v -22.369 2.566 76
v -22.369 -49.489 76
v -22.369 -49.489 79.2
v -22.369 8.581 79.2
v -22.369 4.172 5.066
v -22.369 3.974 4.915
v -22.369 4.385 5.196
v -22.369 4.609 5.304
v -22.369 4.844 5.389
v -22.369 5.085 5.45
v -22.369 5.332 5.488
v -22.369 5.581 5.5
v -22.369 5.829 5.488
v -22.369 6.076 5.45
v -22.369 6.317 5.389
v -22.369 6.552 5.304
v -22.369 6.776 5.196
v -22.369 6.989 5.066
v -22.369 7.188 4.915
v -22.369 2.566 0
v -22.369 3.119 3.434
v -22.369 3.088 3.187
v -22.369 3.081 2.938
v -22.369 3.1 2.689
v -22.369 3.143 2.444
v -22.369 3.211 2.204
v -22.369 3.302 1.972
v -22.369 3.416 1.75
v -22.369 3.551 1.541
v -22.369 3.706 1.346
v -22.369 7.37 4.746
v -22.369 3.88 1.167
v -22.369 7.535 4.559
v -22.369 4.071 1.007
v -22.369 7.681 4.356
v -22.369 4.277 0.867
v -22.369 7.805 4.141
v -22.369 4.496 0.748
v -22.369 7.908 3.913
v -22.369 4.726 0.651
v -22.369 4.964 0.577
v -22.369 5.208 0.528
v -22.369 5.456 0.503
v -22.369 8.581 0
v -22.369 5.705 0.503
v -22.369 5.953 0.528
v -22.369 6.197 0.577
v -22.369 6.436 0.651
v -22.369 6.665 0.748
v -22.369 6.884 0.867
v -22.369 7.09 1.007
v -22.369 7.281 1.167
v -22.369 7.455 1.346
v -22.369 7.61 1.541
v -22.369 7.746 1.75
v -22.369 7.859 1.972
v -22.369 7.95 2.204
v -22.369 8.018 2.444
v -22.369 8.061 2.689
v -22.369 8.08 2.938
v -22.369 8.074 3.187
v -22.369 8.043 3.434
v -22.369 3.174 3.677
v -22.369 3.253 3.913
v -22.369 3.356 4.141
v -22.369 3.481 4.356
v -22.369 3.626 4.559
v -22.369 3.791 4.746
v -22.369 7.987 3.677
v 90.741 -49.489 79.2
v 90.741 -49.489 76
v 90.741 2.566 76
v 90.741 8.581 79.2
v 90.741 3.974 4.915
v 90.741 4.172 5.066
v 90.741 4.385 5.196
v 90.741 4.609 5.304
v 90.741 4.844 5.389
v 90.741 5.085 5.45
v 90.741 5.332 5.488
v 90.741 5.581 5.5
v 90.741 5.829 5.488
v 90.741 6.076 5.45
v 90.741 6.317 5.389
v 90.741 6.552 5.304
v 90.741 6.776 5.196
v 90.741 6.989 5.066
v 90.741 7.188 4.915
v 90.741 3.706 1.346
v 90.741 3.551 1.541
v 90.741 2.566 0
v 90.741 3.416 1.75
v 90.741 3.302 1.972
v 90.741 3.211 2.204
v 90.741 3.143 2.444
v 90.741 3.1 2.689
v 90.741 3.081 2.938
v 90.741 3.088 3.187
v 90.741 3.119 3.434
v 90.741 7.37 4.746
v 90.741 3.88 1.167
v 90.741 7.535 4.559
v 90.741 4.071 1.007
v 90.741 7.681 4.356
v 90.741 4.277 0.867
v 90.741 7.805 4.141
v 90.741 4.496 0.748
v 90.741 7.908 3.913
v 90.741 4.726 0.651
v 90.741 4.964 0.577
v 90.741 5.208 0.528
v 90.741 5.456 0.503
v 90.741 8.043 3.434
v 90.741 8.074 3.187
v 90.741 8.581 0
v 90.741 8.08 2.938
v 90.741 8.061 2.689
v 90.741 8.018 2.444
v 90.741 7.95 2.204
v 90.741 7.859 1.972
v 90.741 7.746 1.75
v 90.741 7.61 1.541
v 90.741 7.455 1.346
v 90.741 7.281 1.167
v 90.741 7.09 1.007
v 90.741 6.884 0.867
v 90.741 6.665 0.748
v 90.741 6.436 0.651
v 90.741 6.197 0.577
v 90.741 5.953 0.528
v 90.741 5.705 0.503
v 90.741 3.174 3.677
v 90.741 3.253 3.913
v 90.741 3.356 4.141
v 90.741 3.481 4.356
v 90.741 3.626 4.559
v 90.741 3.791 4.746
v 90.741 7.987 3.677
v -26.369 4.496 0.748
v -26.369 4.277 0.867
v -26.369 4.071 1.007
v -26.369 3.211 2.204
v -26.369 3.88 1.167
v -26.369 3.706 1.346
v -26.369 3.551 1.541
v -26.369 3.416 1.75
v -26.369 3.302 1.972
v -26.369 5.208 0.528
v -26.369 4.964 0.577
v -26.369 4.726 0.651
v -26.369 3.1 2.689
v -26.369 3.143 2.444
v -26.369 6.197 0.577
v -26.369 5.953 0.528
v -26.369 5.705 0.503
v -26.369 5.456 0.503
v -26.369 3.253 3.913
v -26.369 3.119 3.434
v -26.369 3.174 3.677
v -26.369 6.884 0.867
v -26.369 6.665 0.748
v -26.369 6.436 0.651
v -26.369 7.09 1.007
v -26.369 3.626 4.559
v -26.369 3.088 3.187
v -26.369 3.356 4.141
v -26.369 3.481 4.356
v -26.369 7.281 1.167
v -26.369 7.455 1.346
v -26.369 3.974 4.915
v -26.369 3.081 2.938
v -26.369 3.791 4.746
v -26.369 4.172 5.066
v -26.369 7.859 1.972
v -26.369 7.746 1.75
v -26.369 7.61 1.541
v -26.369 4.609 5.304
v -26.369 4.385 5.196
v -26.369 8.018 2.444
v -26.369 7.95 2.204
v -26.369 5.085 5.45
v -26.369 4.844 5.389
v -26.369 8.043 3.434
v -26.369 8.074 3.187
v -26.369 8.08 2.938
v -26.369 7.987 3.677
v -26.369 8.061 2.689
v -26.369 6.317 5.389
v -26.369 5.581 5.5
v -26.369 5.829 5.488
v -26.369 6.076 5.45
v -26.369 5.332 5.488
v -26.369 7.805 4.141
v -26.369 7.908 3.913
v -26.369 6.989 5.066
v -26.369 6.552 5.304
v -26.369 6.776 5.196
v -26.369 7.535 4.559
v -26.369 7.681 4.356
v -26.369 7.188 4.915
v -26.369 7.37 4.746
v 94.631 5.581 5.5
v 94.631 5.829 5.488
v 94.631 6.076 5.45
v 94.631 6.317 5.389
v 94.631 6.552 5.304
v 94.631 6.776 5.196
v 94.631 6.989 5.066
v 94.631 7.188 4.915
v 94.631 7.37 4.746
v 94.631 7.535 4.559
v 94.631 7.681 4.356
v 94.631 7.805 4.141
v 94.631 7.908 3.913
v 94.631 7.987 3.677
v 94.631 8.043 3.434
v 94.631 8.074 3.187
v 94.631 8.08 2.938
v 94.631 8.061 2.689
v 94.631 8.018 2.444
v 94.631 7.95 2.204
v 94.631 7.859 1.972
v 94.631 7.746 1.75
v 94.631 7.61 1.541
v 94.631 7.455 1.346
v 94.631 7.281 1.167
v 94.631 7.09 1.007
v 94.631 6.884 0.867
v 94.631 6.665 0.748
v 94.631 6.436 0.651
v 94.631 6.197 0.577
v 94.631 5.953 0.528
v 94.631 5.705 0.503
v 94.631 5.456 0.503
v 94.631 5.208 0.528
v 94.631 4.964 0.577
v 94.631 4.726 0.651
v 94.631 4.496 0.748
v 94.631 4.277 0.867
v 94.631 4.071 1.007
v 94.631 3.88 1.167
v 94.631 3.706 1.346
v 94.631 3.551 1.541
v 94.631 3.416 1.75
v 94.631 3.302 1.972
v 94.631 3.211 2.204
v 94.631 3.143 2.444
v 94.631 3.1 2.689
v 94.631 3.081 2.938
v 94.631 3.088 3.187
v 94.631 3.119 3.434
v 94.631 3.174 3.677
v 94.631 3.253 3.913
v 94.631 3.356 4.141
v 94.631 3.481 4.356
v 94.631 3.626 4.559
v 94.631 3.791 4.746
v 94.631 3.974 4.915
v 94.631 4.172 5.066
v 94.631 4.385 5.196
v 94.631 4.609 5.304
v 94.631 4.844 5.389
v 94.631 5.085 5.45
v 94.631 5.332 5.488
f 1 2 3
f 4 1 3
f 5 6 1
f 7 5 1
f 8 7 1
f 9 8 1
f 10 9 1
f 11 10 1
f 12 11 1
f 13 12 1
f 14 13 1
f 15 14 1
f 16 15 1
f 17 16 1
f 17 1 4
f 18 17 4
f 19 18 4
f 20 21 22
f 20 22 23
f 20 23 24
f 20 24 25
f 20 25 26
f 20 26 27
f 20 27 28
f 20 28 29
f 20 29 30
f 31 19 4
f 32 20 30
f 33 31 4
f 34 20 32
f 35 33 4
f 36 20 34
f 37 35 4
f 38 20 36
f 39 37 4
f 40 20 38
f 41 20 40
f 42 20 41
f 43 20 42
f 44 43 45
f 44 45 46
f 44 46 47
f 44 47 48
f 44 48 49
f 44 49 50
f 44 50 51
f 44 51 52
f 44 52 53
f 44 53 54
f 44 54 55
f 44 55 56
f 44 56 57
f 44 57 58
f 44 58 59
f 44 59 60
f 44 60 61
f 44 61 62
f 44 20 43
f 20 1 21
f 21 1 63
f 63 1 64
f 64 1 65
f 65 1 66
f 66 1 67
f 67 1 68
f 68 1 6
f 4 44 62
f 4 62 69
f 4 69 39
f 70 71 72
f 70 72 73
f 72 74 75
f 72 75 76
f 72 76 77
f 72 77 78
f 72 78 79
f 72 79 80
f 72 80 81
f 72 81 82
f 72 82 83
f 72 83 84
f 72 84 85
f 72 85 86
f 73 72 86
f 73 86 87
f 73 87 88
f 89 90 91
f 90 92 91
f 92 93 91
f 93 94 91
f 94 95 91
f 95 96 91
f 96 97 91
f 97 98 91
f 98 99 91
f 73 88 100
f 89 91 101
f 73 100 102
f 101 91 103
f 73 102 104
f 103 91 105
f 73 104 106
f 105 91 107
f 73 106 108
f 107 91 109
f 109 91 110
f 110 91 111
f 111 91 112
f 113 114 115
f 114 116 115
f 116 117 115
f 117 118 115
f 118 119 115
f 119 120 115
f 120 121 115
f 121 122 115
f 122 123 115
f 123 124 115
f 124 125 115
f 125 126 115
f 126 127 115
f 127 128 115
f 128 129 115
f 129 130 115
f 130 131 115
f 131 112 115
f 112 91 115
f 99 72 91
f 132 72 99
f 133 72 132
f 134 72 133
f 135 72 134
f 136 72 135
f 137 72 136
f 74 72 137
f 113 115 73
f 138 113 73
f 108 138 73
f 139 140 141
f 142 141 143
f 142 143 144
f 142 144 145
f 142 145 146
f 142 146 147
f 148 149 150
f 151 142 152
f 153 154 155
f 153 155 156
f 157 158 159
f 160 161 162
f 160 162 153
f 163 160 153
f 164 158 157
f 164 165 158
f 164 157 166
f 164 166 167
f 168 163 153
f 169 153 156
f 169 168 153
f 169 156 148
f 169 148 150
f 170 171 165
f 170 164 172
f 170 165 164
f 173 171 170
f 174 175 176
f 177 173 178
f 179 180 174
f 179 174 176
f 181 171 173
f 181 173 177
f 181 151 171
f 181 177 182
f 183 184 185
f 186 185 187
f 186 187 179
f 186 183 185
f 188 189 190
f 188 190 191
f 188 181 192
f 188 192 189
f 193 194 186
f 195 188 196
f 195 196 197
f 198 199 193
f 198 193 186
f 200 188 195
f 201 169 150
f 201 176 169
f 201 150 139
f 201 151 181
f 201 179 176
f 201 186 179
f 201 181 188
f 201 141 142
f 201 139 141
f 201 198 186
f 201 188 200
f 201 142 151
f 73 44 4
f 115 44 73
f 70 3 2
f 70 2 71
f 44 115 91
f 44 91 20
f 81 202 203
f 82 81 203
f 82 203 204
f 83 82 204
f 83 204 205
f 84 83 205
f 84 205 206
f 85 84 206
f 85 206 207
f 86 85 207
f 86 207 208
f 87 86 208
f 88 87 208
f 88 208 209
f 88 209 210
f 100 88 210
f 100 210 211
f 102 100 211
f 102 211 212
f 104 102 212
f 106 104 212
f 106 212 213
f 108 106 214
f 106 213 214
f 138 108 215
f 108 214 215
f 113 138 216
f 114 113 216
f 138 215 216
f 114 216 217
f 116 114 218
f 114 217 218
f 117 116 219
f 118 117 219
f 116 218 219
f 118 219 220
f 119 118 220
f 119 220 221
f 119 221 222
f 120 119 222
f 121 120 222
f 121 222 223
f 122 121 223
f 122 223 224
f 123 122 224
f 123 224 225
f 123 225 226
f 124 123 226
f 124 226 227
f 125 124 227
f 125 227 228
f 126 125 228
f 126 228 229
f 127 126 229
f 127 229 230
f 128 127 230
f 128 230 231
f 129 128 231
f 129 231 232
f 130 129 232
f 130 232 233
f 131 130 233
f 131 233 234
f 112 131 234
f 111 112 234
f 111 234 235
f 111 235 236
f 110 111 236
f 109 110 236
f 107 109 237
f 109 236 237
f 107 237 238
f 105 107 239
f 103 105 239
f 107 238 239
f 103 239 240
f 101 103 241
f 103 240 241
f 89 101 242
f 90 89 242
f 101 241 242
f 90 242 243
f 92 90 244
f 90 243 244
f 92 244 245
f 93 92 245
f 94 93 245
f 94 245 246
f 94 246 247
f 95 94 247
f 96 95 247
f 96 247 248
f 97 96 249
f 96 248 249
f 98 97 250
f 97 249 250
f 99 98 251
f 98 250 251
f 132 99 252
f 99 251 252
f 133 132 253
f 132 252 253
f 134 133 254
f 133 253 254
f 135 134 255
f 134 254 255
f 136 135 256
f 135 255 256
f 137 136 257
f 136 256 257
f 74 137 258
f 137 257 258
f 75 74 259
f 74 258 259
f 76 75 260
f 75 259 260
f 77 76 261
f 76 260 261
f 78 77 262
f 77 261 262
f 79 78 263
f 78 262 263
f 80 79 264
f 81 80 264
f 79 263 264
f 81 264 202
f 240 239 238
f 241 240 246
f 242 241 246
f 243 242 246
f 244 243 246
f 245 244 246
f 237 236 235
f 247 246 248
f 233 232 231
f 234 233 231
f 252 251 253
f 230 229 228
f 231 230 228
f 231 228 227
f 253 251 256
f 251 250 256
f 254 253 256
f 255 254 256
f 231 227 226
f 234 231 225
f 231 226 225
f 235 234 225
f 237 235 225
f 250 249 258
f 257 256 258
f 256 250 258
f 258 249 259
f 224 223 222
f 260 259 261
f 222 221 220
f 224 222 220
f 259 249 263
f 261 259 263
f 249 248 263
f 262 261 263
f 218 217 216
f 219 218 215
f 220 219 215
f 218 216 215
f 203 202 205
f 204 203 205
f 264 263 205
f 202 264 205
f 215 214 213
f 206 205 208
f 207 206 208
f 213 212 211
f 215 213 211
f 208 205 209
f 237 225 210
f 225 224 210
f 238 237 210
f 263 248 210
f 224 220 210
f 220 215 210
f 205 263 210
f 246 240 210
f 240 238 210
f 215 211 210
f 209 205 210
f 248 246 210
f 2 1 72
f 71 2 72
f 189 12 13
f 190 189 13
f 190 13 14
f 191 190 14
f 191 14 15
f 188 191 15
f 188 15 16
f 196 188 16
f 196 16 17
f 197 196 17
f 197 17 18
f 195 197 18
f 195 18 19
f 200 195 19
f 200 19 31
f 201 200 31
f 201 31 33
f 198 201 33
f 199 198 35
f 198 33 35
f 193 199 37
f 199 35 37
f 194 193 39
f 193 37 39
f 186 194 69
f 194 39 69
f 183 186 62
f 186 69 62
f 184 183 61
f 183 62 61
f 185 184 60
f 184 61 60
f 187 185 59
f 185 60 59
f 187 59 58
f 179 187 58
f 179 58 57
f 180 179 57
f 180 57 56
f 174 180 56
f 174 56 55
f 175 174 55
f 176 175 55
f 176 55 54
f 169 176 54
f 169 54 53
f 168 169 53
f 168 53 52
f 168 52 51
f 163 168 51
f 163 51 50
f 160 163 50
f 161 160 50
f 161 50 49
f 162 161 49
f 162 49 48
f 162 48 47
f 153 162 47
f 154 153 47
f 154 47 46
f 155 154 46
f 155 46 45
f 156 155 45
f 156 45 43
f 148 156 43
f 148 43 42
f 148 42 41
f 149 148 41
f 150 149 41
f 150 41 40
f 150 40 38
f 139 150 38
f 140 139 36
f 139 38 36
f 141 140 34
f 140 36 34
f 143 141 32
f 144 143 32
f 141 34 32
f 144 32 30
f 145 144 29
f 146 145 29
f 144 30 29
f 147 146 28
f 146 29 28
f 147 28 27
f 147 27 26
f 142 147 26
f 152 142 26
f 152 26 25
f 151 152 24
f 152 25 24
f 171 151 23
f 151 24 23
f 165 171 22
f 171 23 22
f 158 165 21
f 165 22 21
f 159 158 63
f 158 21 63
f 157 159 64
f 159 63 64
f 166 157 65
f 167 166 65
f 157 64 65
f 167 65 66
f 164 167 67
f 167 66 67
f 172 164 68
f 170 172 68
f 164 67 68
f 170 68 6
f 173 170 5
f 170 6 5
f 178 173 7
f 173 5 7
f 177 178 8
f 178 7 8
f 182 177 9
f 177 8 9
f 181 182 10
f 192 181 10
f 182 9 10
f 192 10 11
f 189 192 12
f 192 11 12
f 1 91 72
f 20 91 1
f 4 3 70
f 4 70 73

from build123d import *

# Parameters (mm, degrees)
SKETCH1_W                = 113.11
SKETCH1_H                = 5
BOSS_EXTRUDE1_DEPTH      = 80
SKETCH2_W                = 113.11
SKETCH2_H                = 4
BOSS_EXTRUDE3_DEPTH      = 53.07
BOSS_EXTRUDE4_DEPTH      = 4
BOSS_EXTRUDE4_DEPTH_BACK = 117
SKETCH3_R                = 2.5
SKETCH4_W                = 113.11
SKETCH4_H                = 1.014466344
BOSS_EXTRUDE5_DEPTH      = 79
SKETCH5_W                = 0.8
SKETCH5_H                = 62.100076999
CUT_EXTRUDE2_DEPTH       = 224


with BuildPart() as part:
    # Sketch1 → Boss-Extrude1 (new body)
    with BuildSketch(Plane.XY):
        with Locations((34.185736393, 6.080576307)):
            Rectangle(SKETCH1_W, SKETCH1_H)
    extrude(amount=BOSS_EXTRUDE1_DEPTH)

    # Sketch2 → Boss-Extrude3 (add)
    with BuildSketch(Plane.XZ.offset(-3.580576307)):
        with Locations((34.185736393, 78)):
            Rectangle(SKETCH2_W, SKETCH2_H)
    extrude(amount=BOSS_EXTRUDE3_DEPTH)

    # Sketch3 → Boss-Extrude4 (add, two sides: drawn at the far end of the back side and taken through both)
    with BuildSketch(Plane.ZY.offset(22.369263607).offset(-BOSS_EXTRUDE4_DEPTH_BACK)):
        with Locations((3, 5.580576307)):
            Circle(SKETCH3_R)
    extrude(amount=BOSS_EXTRUDE4_DEPTH + BOSS_EXTRUDE4_DEPTH_BACK)

    # Sketch4 → Boss-Extrude5 (add)
    with BuildSketch(Plane(origin=(0, 0, 0), x_dir=(-1, 0, 0), z_dir=(0, 0, -1))):
        with Locations((-34.185736393, 3.073343135)):
            Rectangle(SKETCH4_W, SKETCH4_H)
    extrude(amount=-BOSS_EXTRUDE5_DEPTH)

    # Sketch5 → Cut-Extrude2 (cut)
    with BuildSketch(Plane.ZY.offset(22.369263607)):
        with Locations((79.6, -22.469462192)):
            Rectangle(SKETCH5_W, SKETCH5_H)
    extrude(amount=-CUT_EXTRUDE2_DEPTH, mode=Mode.SUBTRACT)


solid = part.part
